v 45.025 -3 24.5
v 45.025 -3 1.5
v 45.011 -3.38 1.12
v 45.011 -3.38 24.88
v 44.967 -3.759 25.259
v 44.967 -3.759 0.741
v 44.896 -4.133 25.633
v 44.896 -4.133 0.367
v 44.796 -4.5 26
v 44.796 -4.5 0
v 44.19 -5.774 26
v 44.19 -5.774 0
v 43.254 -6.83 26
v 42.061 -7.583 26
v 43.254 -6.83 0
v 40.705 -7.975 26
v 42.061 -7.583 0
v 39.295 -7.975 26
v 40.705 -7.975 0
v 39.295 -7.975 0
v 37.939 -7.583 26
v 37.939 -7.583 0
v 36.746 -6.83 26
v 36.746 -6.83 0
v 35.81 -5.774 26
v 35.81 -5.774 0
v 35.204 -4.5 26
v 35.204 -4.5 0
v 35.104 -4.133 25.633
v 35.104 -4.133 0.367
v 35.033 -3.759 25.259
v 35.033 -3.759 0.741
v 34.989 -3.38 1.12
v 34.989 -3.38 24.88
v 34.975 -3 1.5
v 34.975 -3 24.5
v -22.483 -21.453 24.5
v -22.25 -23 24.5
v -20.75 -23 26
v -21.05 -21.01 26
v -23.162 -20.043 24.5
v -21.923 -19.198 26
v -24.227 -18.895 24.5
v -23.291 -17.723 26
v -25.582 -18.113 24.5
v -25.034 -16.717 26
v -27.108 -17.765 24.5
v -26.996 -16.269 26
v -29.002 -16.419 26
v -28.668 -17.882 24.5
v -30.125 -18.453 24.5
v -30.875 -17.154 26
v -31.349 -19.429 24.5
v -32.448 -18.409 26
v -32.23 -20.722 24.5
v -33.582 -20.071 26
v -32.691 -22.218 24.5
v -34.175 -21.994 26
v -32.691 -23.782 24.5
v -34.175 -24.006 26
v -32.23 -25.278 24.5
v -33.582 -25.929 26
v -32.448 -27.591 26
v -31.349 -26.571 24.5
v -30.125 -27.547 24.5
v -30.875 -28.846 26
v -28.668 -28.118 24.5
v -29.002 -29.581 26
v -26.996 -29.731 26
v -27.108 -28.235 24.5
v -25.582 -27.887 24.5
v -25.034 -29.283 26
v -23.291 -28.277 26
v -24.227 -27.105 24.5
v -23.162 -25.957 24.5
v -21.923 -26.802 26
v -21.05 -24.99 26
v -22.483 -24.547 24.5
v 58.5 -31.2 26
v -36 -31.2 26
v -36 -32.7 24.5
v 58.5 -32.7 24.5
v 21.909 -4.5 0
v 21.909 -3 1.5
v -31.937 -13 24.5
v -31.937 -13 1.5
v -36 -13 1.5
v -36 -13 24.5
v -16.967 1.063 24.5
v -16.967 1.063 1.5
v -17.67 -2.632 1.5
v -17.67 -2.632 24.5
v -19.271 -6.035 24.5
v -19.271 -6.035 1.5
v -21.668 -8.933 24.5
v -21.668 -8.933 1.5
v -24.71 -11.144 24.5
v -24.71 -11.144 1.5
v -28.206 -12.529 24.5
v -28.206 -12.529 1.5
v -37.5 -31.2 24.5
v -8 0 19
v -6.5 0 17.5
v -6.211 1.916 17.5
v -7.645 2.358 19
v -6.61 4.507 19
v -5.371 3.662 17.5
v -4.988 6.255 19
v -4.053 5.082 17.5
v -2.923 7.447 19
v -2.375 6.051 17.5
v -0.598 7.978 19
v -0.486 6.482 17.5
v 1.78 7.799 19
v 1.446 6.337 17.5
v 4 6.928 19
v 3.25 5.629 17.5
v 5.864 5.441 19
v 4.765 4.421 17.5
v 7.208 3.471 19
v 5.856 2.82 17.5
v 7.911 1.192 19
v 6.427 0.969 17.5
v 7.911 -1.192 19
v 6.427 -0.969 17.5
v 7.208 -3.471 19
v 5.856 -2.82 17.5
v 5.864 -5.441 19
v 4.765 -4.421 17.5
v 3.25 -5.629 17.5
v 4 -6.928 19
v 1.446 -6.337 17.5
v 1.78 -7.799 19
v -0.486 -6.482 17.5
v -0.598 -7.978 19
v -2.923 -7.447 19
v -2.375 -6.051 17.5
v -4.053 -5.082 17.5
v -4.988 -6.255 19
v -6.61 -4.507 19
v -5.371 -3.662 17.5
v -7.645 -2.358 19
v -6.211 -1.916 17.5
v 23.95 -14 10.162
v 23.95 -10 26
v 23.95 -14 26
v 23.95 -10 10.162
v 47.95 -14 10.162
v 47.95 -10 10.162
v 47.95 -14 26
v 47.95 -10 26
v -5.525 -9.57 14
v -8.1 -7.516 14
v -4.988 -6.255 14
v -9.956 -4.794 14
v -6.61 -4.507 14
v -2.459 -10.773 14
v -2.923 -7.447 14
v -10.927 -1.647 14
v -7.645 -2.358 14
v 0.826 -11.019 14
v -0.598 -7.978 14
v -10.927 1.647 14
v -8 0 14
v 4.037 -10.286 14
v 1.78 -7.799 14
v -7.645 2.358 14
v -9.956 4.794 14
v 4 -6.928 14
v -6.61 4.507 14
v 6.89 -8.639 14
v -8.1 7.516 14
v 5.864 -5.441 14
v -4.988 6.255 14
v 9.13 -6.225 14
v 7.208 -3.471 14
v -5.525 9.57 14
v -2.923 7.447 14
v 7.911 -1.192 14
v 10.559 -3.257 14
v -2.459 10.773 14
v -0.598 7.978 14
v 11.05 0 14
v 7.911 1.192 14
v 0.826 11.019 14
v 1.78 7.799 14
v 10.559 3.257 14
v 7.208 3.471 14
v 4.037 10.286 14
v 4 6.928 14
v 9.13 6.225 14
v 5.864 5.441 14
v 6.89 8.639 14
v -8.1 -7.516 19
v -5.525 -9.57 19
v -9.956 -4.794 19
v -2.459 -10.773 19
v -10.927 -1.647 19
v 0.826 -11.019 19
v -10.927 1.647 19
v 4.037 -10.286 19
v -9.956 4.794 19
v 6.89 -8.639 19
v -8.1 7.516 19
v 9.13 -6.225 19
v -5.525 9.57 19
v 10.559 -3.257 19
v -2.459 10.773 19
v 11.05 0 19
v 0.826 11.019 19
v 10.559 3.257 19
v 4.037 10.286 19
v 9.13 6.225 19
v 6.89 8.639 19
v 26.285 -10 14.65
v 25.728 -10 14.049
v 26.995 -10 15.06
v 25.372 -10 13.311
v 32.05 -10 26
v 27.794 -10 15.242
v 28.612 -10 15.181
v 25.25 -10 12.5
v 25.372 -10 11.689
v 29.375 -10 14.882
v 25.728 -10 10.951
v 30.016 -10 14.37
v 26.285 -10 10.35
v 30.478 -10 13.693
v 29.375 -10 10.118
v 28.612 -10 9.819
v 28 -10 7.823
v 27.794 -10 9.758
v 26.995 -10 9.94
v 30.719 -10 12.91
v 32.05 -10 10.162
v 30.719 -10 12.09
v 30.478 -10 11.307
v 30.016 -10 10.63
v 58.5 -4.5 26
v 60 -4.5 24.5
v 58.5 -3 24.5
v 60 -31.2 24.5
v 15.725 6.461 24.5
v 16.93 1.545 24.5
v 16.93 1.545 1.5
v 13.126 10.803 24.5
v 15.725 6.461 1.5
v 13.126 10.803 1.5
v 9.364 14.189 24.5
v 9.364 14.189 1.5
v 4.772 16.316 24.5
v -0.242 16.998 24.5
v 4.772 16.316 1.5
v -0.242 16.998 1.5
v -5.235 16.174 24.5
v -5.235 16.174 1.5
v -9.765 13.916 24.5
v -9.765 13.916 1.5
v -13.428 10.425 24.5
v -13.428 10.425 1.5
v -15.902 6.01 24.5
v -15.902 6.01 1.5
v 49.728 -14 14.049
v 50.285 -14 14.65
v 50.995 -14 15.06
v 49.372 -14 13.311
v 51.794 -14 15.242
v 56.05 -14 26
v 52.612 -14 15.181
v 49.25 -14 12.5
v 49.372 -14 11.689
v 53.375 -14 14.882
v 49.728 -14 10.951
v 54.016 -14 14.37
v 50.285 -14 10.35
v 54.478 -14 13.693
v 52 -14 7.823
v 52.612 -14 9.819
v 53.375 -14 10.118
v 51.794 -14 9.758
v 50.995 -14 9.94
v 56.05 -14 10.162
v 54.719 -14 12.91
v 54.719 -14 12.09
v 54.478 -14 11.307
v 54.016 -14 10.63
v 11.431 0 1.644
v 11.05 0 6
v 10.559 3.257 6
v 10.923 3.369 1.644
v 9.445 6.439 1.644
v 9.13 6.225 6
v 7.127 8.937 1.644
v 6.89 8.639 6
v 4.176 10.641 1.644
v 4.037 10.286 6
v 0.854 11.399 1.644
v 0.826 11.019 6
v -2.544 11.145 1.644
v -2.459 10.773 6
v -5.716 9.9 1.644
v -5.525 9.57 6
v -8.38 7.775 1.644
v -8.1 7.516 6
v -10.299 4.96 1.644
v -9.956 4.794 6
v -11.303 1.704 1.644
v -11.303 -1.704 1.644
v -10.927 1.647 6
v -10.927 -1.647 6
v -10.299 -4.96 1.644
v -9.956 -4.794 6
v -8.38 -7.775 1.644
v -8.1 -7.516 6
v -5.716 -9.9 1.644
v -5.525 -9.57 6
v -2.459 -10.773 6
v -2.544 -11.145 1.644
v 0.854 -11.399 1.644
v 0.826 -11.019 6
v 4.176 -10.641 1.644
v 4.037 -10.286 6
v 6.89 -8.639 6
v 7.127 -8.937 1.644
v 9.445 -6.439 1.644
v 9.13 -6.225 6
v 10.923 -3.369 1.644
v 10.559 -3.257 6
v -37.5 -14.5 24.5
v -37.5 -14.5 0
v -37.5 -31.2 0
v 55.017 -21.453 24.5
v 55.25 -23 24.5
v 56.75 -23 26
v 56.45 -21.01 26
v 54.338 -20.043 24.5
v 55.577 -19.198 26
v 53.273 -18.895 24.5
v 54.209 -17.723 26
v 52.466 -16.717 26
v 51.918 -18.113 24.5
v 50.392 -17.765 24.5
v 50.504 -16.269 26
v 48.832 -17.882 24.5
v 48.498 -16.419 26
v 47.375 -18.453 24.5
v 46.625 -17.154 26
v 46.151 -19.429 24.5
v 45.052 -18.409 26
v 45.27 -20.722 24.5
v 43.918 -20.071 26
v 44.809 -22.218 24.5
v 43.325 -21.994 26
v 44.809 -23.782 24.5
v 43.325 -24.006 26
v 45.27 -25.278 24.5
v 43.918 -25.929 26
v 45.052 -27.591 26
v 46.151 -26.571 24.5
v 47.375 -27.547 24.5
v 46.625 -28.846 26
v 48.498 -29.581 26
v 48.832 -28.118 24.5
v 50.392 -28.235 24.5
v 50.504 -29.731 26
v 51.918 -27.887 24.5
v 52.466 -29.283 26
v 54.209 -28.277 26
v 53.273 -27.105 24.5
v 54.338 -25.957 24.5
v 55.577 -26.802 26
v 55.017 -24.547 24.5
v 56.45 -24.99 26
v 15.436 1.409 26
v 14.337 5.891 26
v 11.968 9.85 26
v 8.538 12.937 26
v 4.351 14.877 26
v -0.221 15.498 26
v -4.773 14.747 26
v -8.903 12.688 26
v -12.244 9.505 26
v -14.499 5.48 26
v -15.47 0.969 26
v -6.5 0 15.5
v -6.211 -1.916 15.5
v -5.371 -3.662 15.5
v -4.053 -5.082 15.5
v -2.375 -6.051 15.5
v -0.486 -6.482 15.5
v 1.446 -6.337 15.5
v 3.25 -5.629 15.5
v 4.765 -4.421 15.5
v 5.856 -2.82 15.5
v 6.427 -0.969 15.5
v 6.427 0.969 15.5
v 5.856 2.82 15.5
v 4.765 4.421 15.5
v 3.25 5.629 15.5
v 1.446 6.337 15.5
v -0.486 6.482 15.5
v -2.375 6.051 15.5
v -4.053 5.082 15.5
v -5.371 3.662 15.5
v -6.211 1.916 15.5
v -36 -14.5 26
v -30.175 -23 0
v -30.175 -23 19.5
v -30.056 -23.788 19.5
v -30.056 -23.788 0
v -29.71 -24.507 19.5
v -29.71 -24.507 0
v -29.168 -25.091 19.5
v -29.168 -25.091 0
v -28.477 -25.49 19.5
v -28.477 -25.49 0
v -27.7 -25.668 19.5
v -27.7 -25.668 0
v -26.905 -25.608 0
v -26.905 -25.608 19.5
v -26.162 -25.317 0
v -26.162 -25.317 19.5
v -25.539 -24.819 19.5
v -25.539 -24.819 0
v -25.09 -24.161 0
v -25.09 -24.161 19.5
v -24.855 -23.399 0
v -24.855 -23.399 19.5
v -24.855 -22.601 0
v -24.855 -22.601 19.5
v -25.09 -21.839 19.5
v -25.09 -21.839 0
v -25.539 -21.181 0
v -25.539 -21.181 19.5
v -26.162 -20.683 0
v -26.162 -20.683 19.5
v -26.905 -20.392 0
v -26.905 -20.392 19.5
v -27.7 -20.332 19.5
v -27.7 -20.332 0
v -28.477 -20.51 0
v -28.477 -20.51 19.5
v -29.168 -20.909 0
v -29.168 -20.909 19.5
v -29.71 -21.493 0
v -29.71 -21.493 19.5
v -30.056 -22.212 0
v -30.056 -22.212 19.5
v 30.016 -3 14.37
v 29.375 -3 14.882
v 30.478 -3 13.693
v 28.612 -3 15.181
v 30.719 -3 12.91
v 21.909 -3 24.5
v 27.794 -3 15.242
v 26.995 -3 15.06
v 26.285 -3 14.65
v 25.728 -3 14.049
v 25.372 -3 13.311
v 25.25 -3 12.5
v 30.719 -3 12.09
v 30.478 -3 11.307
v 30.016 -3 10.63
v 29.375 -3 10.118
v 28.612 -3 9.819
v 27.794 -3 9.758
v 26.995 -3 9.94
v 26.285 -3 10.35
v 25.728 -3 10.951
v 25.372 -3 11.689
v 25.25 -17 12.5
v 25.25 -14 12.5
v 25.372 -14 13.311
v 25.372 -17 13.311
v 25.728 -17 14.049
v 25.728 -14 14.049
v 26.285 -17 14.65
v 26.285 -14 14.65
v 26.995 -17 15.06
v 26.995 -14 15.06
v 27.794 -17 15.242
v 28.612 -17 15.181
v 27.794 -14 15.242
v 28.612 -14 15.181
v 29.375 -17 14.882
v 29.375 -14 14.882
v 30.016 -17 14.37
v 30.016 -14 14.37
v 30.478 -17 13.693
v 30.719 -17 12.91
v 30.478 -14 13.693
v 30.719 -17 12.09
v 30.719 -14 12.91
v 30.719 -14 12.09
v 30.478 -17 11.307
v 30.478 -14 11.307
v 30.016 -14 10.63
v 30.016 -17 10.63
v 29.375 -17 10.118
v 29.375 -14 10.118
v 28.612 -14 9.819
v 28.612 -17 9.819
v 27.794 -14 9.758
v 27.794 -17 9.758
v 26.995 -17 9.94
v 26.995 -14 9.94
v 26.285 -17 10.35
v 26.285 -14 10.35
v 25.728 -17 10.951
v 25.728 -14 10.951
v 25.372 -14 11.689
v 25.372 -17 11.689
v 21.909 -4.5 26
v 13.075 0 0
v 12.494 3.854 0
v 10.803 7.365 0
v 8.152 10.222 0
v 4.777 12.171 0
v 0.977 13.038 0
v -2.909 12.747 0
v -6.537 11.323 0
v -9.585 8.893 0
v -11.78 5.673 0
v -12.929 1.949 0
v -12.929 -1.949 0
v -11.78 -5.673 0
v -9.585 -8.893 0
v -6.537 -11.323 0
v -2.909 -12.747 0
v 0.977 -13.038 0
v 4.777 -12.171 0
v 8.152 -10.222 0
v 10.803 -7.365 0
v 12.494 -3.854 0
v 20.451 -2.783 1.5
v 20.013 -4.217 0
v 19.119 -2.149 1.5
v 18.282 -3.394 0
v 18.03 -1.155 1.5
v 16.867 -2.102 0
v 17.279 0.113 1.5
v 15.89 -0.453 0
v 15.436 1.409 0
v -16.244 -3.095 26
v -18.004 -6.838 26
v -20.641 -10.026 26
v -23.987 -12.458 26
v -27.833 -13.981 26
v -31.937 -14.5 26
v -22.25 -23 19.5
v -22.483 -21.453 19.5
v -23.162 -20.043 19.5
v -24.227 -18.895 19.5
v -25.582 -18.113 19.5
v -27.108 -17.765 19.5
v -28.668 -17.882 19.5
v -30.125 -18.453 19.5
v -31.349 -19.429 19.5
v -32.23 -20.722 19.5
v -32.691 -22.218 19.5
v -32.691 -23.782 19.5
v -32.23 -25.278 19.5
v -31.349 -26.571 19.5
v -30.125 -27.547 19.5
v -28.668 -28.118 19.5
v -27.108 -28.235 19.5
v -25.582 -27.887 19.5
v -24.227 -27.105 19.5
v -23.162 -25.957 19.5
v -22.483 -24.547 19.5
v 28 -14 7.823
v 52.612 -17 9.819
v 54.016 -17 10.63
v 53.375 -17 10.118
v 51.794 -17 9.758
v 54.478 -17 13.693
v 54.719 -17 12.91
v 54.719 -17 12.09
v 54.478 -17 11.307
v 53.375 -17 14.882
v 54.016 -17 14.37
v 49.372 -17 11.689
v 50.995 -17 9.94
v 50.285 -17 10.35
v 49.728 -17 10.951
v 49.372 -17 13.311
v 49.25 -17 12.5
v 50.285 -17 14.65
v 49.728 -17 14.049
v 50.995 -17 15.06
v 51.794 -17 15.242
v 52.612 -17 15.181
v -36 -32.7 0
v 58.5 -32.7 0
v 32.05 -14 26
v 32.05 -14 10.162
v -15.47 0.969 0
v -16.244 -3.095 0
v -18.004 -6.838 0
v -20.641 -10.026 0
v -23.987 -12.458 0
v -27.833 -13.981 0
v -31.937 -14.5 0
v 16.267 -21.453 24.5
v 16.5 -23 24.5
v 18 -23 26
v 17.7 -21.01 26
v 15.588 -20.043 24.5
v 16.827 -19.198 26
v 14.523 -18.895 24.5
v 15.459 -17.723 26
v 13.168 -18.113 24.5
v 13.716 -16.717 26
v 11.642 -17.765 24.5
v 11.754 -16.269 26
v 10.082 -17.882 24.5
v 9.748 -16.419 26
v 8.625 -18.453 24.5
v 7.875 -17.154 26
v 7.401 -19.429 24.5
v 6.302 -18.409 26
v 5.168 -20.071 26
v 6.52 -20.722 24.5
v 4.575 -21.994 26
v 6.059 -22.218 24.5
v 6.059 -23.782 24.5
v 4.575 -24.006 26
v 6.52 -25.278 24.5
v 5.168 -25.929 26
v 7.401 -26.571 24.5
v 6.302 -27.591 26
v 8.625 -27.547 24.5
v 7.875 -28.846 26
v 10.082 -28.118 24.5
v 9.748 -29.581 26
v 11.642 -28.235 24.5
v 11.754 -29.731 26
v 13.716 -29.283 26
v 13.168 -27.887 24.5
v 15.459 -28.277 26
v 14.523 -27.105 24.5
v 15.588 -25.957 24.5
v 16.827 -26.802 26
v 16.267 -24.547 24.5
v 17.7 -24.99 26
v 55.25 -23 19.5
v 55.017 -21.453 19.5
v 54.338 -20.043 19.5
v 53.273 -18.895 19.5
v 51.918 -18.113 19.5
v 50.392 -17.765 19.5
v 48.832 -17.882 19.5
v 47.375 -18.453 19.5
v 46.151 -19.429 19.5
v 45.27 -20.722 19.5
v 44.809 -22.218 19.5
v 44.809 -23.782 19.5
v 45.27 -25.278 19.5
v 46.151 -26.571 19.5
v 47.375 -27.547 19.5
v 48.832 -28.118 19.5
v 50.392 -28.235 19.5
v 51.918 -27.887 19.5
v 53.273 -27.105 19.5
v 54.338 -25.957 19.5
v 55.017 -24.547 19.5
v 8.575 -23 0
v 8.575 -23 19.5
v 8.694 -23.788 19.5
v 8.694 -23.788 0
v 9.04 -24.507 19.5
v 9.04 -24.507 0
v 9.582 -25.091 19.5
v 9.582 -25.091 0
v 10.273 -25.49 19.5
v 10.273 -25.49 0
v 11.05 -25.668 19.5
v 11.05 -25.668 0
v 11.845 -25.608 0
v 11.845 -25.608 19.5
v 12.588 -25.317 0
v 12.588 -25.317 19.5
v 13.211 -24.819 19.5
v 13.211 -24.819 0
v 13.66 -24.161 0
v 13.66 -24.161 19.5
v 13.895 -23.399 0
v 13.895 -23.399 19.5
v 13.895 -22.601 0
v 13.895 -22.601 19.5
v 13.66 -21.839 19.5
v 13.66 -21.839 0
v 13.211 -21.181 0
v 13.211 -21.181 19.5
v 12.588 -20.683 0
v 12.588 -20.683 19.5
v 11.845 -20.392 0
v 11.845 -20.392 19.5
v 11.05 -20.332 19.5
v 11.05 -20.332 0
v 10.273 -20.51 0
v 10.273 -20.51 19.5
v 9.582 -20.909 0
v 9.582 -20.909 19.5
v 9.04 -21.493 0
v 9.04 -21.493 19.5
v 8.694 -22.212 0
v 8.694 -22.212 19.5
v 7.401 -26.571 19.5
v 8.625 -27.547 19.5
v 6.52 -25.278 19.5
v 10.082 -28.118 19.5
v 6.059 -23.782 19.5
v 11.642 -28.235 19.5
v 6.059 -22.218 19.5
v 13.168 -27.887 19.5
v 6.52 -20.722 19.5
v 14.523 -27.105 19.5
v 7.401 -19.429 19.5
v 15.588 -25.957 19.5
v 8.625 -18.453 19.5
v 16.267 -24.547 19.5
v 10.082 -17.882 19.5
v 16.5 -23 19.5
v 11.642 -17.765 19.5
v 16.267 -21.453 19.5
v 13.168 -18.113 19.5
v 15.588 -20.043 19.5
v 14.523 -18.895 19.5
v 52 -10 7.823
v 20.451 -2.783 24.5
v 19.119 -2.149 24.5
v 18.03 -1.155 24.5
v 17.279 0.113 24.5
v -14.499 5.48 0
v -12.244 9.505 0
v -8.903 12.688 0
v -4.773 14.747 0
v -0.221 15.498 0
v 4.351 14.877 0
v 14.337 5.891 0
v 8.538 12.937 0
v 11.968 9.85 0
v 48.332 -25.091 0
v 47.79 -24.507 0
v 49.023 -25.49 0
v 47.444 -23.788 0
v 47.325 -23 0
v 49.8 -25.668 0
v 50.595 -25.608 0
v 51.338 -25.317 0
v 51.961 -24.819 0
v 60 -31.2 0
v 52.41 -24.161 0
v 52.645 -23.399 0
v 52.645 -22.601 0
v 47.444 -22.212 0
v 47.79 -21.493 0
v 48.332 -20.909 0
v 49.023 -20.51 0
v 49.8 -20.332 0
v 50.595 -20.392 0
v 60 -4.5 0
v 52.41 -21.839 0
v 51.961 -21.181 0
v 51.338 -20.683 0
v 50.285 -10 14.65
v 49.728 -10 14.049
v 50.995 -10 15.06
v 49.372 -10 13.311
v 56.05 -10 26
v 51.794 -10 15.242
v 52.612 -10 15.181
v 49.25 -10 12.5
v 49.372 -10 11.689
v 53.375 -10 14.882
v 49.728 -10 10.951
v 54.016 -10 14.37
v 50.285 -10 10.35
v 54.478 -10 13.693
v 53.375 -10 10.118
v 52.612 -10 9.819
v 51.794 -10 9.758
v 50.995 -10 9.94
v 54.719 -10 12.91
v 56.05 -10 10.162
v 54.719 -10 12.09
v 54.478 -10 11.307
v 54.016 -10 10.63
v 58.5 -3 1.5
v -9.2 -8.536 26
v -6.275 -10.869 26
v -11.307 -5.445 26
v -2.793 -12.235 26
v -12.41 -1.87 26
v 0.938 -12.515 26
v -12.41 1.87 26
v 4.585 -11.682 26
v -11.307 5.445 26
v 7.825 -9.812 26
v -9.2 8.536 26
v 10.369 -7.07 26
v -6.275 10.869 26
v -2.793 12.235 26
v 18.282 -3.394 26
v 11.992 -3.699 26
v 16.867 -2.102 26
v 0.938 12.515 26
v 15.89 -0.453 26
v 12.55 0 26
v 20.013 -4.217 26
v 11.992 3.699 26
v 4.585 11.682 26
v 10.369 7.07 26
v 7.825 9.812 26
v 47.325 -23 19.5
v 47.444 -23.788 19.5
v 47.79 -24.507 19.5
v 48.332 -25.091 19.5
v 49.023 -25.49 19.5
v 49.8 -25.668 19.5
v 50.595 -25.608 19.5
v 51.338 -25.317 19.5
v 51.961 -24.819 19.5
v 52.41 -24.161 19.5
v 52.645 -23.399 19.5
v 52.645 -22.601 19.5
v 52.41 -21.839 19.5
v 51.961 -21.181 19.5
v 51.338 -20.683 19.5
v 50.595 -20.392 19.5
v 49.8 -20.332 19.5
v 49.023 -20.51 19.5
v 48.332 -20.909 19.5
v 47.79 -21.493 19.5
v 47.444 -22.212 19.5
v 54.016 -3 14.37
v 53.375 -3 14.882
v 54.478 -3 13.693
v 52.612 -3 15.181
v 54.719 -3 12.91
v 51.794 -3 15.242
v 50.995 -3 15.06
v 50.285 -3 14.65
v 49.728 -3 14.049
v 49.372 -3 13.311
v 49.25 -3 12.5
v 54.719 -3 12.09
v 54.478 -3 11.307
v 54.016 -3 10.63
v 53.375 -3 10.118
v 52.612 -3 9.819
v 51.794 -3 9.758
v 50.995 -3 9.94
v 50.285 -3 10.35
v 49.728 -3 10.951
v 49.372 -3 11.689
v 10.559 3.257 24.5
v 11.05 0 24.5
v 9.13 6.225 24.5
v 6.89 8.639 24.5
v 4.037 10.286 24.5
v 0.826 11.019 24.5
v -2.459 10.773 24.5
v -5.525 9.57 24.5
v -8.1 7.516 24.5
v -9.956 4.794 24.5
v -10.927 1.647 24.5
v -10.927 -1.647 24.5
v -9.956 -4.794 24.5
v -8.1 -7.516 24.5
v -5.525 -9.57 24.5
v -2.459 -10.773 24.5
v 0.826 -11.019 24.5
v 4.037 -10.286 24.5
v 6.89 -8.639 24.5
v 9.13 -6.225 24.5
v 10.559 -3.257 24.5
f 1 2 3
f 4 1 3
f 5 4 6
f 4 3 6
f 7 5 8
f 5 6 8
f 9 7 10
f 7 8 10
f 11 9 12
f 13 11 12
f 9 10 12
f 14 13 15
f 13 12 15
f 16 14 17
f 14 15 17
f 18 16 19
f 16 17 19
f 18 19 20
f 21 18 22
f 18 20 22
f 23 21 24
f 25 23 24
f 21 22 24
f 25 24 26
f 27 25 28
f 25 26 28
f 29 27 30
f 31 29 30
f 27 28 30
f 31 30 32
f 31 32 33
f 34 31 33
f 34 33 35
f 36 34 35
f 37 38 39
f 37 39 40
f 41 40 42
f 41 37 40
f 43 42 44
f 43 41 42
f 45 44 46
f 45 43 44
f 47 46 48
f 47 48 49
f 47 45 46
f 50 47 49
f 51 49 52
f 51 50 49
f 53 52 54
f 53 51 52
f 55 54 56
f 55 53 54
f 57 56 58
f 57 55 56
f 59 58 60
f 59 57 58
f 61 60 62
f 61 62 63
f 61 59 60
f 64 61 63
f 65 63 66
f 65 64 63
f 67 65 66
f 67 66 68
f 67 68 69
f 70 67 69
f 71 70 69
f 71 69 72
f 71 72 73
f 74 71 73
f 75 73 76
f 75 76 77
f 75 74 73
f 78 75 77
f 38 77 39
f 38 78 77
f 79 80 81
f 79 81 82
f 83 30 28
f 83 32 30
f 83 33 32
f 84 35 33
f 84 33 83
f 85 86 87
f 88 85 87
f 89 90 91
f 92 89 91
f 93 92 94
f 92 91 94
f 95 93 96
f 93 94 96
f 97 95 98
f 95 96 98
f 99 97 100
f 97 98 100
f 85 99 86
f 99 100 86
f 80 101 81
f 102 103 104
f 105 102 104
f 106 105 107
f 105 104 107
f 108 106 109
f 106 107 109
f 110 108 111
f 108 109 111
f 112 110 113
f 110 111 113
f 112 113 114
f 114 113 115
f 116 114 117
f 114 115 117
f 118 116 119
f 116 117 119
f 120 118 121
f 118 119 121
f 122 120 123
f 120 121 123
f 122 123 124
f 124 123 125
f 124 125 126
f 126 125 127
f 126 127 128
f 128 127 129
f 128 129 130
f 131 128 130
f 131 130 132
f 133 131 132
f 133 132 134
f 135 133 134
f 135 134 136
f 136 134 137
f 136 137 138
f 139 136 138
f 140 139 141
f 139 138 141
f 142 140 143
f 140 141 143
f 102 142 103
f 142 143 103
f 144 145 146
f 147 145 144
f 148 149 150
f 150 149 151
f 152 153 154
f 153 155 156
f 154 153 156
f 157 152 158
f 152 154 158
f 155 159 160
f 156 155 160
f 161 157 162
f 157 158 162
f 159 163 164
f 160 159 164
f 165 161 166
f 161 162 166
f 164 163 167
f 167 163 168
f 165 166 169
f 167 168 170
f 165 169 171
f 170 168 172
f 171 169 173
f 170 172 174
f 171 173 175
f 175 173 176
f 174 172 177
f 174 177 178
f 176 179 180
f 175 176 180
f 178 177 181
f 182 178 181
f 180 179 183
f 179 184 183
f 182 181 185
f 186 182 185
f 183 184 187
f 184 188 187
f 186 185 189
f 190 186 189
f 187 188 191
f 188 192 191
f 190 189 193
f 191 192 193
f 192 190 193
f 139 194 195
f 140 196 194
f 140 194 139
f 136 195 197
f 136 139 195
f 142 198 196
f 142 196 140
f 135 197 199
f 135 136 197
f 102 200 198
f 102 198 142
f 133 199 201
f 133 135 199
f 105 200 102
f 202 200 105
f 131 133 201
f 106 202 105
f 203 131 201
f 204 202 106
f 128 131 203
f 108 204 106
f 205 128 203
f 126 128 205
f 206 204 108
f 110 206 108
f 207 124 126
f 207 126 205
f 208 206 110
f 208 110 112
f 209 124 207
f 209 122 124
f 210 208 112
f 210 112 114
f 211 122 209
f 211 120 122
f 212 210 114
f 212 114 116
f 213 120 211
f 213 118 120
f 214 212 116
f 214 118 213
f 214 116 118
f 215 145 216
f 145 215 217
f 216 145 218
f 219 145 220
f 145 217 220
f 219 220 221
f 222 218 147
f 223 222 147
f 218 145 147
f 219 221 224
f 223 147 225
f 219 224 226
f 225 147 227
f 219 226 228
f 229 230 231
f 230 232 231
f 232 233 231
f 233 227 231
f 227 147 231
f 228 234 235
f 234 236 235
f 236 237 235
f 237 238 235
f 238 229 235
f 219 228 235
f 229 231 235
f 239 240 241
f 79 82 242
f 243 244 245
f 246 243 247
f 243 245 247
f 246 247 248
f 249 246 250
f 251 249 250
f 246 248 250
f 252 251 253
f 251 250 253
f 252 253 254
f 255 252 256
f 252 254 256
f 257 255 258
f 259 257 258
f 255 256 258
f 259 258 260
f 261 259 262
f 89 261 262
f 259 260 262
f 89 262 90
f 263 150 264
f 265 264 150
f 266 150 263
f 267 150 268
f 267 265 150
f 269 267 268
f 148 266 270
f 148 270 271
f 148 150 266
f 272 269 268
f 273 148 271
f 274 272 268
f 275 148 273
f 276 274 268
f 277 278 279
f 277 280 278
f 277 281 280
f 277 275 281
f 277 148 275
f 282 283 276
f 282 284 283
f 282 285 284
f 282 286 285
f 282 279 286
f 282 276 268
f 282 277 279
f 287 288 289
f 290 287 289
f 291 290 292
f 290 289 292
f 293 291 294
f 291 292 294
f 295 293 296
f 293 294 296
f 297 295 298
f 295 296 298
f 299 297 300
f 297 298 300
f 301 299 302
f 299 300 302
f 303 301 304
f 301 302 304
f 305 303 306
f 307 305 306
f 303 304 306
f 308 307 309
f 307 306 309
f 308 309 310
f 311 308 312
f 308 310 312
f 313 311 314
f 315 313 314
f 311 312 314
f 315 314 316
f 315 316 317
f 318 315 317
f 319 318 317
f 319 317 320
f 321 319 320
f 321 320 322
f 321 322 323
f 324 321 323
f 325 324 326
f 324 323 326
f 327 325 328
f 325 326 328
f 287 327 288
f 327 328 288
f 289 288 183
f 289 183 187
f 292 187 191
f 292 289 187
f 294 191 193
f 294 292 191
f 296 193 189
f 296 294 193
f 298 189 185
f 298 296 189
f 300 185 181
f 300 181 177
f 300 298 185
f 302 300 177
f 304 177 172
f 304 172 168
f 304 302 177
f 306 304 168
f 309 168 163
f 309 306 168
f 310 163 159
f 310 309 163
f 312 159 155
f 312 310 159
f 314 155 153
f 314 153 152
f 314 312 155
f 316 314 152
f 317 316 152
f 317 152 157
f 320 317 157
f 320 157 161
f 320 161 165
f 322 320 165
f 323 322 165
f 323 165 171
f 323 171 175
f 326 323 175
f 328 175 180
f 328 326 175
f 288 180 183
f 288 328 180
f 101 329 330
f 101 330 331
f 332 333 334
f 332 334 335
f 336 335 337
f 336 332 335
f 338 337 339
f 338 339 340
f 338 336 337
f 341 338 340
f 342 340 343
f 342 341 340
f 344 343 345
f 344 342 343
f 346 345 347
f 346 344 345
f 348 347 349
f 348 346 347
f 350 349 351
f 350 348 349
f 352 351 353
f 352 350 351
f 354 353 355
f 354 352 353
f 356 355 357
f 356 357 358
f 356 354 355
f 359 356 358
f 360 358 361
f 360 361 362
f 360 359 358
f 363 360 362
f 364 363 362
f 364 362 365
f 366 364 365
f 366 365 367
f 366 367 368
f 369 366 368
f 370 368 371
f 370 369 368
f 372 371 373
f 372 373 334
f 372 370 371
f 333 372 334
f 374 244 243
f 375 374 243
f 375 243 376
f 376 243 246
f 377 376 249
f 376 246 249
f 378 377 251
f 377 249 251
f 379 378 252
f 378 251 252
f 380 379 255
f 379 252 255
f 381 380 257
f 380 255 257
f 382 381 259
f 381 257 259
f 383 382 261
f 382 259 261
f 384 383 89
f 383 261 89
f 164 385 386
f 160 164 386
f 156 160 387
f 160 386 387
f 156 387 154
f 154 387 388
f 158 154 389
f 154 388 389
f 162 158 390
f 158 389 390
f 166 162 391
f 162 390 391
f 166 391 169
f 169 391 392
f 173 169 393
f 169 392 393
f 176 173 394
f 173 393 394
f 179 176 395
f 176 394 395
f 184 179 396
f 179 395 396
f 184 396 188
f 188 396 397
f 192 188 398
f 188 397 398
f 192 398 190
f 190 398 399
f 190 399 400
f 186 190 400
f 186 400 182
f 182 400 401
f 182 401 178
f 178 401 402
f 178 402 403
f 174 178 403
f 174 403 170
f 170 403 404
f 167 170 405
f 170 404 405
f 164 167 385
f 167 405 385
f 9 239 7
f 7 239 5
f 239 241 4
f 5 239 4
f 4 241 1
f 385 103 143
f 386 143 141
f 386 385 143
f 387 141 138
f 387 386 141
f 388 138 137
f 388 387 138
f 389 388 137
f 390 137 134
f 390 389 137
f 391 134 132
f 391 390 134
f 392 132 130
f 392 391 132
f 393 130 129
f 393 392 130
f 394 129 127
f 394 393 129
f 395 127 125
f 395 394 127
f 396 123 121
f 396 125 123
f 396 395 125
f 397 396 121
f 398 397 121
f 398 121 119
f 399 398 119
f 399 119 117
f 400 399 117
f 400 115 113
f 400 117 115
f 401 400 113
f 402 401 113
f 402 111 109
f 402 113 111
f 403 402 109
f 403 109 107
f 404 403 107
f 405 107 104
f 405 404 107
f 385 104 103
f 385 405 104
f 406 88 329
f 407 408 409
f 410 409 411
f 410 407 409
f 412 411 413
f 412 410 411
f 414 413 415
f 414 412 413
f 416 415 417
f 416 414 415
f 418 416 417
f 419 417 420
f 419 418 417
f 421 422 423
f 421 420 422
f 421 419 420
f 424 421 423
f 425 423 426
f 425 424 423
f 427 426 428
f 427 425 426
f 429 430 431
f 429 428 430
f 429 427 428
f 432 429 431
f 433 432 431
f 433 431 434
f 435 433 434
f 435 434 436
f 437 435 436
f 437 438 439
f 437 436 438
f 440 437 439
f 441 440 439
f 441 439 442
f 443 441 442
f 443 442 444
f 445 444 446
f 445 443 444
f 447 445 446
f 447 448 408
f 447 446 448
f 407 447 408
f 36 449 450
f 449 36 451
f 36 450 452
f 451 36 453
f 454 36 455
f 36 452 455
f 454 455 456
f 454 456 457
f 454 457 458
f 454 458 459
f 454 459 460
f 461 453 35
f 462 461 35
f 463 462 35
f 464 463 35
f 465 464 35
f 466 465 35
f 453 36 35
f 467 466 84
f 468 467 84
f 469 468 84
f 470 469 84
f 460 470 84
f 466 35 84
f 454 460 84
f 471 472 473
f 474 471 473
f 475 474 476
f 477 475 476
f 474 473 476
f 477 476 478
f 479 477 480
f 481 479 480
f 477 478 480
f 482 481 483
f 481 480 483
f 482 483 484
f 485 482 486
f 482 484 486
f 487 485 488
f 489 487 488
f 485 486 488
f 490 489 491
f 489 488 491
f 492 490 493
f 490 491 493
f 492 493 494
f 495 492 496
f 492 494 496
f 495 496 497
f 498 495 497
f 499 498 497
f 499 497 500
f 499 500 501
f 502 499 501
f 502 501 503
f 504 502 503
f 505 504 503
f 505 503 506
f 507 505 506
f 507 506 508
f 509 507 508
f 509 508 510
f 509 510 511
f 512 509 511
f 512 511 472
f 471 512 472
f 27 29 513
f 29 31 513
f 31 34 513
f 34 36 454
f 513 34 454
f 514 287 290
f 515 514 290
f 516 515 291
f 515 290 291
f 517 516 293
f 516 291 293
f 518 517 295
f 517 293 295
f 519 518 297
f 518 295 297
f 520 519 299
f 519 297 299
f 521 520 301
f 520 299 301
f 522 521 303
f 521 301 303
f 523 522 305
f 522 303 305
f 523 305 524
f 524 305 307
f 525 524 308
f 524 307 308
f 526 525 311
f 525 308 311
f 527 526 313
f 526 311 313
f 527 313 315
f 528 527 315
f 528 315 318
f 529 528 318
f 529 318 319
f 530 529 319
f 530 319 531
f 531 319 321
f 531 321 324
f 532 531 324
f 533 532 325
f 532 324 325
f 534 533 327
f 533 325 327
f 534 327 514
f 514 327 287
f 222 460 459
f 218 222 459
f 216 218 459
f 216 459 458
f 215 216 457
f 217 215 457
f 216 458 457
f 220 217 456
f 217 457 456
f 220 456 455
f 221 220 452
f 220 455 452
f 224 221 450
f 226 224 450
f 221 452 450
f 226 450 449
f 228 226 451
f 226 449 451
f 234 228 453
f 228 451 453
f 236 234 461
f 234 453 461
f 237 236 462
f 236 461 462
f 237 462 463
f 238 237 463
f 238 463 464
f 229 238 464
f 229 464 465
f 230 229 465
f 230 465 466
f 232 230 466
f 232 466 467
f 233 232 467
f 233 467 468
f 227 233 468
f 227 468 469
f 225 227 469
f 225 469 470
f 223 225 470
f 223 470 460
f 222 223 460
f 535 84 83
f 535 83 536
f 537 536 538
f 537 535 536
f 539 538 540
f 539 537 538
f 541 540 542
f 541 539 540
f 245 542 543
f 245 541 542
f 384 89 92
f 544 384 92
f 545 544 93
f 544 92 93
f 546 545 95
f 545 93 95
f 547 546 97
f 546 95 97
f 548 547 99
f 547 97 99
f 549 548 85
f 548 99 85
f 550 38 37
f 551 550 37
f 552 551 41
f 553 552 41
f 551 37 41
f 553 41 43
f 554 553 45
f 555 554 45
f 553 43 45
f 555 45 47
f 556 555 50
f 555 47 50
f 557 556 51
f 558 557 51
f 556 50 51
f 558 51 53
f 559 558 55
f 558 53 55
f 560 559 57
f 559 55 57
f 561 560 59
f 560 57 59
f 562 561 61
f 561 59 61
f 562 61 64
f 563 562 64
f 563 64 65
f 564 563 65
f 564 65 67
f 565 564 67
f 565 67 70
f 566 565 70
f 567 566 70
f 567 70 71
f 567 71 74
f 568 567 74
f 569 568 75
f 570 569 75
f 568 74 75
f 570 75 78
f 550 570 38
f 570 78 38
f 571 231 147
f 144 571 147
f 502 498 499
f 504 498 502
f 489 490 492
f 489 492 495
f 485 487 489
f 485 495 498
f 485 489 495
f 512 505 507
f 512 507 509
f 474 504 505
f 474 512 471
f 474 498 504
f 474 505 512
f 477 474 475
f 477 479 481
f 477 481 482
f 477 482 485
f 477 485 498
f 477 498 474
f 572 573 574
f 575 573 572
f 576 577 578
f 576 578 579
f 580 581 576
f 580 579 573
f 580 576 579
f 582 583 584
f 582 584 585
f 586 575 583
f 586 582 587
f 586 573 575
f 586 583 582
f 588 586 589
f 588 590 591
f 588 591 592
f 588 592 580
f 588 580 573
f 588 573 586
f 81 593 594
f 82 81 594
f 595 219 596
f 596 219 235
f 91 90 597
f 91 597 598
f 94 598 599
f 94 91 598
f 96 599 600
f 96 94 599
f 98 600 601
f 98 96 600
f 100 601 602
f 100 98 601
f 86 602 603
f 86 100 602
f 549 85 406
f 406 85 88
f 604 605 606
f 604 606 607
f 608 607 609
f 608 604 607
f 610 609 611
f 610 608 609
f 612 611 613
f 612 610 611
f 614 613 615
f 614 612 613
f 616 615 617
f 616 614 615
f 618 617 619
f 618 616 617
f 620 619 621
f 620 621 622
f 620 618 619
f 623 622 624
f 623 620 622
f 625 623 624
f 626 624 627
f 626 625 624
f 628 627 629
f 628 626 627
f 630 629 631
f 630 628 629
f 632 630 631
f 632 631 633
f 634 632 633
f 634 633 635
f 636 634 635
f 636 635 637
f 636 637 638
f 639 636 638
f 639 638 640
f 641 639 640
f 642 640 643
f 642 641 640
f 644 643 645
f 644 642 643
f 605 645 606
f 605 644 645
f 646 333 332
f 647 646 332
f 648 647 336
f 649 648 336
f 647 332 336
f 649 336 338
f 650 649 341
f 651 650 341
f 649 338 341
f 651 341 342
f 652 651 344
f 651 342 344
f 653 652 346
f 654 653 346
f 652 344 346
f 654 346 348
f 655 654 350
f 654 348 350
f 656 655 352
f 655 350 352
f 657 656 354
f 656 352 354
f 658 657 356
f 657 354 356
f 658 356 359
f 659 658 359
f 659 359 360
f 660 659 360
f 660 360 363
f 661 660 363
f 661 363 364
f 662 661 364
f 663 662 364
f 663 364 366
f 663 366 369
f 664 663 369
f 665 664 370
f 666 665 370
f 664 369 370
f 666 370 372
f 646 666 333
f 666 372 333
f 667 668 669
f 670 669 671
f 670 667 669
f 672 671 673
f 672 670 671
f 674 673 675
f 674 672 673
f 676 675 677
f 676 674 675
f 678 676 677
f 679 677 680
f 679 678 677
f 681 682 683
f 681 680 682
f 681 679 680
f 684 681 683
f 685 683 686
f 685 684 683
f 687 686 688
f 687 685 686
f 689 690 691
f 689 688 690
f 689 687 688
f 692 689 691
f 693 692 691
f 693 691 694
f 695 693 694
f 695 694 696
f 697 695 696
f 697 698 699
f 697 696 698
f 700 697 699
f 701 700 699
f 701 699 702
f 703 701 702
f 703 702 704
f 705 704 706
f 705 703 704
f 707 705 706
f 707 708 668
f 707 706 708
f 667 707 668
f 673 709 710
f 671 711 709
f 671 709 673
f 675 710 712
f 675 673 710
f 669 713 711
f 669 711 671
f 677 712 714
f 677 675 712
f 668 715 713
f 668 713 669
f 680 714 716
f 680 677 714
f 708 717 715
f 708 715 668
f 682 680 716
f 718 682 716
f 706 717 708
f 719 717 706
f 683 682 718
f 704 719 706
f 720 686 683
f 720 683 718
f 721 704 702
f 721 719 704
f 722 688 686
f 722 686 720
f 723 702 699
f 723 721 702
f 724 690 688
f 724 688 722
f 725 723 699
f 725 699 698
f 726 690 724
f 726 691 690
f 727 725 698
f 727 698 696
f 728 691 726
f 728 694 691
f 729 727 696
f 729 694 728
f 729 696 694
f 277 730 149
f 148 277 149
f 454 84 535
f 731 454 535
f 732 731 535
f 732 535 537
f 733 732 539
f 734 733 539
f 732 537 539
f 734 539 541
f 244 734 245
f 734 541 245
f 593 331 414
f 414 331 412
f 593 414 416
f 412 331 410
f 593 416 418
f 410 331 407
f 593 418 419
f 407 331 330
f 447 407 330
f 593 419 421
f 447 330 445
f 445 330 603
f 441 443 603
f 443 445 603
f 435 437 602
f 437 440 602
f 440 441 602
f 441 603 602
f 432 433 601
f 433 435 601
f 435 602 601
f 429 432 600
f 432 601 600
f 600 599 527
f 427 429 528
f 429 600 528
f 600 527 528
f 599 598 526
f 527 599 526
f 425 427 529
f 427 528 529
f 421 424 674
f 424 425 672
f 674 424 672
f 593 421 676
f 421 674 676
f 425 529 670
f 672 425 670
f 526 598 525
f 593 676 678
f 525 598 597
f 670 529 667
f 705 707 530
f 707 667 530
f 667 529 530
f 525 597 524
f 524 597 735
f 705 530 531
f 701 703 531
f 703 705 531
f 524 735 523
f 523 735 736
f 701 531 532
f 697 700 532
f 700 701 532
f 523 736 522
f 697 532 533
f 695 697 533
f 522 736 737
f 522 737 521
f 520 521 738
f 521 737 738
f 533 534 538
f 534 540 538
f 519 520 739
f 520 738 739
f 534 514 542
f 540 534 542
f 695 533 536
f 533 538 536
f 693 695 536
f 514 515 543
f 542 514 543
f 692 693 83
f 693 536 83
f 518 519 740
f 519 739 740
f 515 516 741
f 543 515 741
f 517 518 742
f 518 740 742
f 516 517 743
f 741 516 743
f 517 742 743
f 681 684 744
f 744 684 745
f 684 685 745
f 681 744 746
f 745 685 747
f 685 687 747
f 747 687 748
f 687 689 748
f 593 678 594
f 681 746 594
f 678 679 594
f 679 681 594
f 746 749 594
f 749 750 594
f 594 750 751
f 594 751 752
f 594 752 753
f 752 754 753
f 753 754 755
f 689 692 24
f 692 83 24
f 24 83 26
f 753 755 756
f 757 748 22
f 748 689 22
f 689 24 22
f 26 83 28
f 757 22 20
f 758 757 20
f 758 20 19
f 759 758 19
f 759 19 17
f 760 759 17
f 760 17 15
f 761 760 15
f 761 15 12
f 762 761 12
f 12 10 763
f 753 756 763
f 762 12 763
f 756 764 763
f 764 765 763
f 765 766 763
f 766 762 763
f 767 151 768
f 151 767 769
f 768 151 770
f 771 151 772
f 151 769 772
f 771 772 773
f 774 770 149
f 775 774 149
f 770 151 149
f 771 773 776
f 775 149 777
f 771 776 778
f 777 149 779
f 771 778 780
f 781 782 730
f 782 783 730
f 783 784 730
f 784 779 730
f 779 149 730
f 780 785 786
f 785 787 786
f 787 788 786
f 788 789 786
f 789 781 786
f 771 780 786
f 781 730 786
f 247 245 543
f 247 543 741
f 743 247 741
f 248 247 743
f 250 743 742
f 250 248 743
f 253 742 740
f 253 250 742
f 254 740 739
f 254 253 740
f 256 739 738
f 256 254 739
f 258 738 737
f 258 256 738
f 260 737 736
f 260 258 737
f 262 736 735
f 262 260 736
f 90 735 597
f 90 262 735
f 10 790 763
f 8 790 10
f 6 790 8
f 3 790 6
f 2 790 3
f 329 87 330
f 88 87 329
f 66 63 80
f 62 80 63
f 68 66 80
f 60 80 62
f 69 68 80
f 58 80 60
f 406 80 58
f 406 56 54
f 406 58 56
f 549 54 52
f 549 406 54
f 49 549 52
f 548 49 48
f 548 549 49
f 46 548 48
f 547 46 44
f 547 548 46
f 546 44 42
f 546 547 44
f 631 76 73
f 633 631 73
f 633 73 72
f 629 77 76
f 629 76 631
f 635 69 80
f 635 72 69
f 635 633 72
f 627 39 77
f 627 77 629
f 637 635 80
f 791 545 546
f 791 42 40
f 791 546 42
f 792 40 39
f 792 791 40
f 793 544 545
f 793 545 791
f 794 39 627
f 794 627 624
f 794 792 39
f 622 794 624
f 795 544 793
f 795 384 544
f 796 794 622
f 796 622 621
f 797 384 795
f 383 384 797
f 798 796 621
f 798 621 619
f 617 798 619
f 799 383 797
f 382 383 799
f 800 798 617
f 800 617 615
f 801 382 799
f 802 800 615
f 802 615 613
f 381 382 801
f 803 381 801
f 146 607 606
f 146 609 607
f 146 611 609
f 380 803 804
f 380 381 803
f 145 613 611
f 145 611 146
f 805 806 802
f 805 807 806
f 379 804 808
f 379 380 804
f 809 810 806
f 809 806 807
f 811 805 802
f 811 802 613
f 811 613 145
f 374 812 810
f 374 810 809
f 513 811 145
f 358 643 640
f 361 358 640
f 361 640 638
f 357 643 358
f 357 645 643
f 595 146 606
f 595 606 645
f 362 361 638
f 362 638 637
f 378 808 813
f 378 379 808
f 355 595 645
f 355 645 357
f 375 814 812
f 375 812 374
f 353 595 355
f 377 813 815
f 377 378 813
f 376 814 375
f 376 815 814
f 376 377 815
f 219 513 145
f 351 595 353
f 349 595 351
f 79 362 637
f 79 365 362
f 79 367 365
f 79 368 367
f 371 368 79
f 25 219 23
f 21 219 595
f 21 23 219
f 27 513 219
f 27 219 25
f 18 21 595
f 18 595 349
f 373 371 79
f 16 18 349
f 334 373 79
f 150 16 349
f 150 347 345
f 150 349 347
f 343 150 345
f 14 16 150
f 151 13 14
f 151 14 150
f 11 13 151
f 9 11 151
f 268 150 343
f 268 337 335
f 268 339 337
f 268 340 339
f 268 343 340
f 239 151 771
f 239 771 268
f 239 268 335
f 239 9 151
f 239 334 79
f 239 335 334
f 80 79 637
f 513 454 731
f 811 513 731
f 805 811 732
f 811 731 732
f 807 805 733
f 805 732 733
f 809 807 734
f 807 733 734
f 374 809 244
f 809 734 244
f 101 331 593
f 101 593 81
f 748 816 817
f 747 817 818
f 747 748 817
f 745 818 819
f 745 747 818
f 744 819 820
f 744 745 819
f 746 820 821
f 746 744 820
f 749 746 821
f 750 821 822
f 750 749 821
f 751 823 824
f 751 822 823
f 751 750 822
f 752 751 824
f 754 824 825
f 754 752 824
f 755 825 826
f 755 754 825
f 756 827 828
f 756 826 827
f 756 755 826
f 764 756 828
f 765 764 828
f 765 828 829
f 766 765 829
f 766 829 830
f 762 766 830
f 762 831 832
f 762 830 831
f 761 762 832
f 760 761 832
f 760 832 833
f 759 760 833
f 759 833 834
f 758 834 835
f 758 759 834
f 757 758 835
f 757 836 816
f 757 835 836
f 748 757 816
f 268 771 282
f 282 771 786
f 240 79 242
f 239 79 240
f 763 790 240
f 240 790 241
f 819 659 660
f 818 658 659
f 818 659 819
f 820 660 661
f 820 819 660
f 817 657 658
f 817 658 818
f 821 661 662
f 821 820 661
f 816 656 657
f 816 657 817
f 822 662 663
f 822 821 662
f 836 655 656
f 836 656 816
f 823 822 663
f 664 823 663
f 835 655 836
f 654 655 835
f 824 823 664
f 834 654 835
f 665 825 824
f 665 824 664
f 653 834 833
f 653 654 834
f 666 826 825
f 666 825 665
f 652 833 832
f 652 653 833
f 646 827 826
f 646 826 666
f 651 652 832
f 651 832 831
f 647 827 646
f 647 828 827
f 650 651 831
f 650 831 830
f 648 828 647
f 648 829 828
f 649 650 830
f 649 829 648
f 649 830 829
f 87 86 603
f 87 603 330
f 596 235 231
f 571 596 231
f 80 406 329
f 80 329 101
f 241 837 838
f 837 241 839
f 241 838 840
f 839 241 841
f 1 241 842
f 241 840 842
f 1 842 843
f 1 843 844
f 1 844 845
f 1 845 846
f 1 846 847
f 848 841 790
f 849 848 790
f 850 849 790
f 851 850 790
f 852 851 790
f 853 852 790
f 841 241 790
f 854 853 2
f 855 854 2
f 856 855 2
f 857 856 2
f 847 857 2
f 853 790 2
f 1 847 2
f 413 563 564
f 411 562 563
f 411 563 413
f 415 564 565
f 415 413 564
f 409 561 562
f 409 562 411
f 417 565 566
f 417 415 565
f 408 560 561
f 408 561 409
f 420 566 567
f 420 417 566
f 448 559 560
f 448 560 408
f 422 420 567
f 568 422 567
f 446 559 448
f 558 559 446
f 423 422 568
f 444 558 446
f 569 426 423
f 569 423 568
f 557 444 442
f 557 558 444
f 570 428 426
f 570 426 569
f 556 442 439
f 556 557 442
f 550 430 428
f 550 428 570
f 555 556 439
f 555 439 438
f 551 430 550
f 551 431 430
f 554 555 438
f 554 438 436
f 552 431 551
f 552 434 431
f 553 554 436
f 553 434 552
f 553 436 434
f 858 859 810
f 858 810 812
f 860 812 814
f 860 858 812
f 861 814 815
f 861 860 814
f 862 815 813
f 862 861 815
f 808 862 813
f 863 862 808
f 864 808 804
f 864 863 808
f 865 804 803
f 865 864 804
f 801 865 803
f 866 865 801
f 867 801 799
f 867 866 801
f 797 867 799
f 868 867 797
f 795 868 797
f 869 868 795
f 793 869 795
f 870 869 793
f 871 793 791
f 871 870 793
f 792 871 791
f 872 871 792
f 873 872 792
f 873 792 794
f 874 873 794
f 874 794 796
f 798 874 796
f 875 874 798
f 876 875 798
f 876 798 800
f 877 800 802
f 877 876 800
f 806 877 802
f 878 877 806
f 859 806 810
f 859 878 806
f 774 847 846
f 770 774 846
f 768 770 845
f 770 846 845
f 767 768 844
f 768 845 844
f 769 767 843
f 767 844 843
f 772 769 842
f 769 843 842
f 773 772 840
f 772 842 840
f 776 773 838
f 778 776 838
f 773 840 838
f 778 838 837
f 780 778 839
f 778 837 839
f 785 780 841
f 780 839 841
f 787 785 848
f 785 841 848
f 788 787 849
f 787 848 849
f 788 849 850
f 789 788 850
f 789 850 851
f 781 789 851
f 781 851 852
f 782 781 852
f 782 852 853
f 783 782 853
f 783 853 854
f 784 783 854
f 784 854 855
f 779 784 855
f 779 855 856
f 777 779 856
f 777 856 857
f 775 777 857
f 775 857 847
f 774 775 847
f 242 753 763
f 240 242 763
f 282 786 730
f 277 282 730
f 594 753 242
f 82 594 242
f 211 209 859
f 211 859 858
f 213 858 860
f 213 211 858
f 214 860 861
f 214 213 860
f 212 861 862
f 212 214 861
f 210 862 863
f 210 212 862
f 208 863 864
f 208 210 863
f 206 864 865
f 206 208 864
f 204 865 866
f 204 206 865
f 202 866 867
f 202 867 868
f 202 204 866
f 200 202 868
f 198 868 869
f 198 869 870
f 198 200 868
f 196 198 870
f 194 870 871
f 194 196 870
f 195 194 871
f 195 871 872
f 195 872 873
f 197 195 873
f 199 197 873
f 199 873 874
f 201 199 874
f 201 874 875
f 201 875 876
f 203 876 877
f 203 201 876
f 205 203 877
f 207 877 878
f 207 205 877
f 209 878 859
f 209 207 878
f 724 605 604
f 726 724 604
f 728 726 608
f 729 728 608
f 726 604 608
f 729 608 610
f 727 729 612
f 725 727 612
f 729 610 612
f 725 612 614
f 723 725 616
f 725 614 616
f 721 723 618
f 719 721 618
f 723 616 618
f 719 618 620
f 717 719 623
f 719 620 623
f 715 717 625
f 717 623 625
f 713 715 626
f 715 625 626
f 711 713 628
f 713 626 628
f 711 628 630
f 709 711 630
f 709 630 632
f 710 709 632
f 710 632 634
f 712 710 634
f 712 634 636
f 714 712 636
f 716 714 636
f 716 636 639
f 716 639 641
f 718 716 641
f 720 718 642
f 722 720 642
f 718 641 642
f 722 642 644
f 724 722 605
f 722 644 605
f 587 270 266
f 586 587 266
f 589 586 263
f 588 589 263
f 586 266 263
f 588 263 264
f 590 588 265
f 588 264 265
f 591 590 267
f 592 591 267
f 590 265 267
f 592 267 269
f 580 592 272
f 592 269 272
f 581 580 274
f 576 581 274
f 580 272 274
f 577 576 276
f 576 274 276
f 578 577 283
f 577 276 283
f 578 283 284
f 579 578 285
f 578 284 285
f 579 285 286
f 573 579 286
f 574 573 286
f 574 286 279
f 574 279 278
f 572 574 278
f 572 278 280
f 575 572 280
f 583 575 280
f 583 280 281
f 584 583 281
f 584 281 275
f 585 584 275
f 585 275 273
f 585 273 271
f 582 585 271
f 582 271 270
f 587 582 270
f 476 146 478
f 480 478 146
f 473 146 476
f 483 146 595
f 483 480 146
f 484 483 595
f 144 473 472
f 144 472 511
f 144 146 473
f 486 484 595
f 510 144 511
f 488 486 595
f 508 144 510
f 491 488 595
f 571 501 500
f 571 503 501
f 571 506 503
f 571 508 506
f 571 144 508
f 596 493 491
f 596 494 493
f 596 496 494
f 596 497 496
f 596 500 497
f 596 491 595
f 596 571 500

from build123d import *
from OCP.BRepFilletAPI import BRepFilletAPI_MakeChamfer

# Parameters (mm, degrees)
SKETCH1_R           = 2.675
SKETCH1_R_2         = 6.5
BOSS_EXTRUDE1_DEPTH = 26
CUT_EXTRUDE2_START  = 6
SKETCH1_4_R         = 11.05
SKETCH1_4_R_2       = 6.5
CUT_EXTRUDE2_DEPTH  = 8
SKETCH5_R           = 11.05
CUT_EXTRUDE6_DEPTH  = 6
CUT_EXTRUDE6_DRAFT  = 5
SKETCH4_R           = 5.25
CUT_EXTRUDE5_DEPTH  = 6.5
CUT_EXTRUDE10_START = -7
SKETCH9_R           = 11.05
CUT_EXTRUDE10_DEPTH = 7
CHAMFER5_SIZE       = 1.5
CHAMFER5_SIZE2      = 1.650094301
SKETCH6_R           = 2.75
CUT_EXTRUDE7_DEPTH  = 14
CUT_EXTRUDE8_START  = -7
SKETCH7_R           = 2.75
SKETCH7_W           = 8.1
SKETCH7_H           = 1.5
CUT_EXTRUDE8_DEPTH  = 4


with BuildPart() as part:
    # Sketch1 → Boss-Extrude1 (new body)
    with BuildSketch(Plane.XY):
        with BuildLine():
            Line((-37.5, -32.7), (60, -32.7))
            Line((60, -32.7), (60, -3))
            Line((60, -3), (45.025, -3))
            ThreePointArc((45.025, -3), (40, -8.025), (34.975, -3))
            Line((34.975, -3), (21.9089023, -3))
            ThreePointArc((21.9089023, -3), (18.537902988, -1.692744729), (16.929606323, 1.545454545))
            ThreePointArc((16.929606323, 1.545454545), (-0.242190945, 16.998274723), (-16.966764387, 1.0625))
            ThreePointArc((-16.966764387, 1.0625), (-21.667640892, -8.933034803), (-31.937438845, -13))
            Line((-31.937438845, -13), (-37.5, -13))
            Line((-37.5, -13), (-37.5, -32.7))
        make_face()
        with Locations(Location((-27.5, -23, 0), (0, 0, 180))):
            Circle(SKETCH1_R, mode=Mode.SUBTRACT)
        with Locations(Location((50, -23, 0), (0, 0, 180))):
            Circle(SKETCH1_R, mode=Mode.SUBTRACT)
        with Locations(Location((0, 0, 0), (0, 0, 180))):
            Circle(SKETCH1_R_2, mode=Mode.SUBTRACT)
        with Locations(Location((11.25, -23, 0), (0, 0, 180))):
            Circle(SKETCH1_R, mode=Mode.SUBTRACT)
    extrude(amount=BOSS_EXTRUDE1_DEPTH)

    # Sketch1<4> → Cut-Extrude2 (cut)
    with BuildSketch(Plane.XY.offset(CUT_EXTRUDE2_START)):
        Circle(SKETCH1_4_R)
        with Locations(Location((0, 0, 0), (0, 0, 180))):
            Circle(SKETCH1_4_R_2, mode=Mode.SUBTRACT)
    extrude(amount=CUT_EXTRUDE2_DEPTH, mode=Mode.SUBTRACT)


with BuildPart() as cut_extrude6_tool:
    # Sketch5 → Cut-Extrude6 (with draft: the straight prism first)
    with BuildSketch(Plane.XY.offset(6)):
        Circle(SKETCH5_R)
    extrude(amount=-CUT_EXTRUDE6_DEPTH)
    # Cut-Extrude6: the draft: its side faces are tilted about the plane it starts from
    cut_extrude6_sides = [cut_extrude6_tool.faces().sort_by_distance(p)[0] for p in [
        (-11.05, 0, 3),
    ]]
    draft(cut_extrude6_sides, Plane.XY.offset(6), CUT_EXTRUDE6_DRAFT)


with BuildPart() as part_1:
    add(part.part)

    # Cut-Extrude6: cut by cut_extrude6_tool
    add(cut_extrude6_tool.part, mode=Mode.SUBTRACT)

    # Sketch4 → Cut-Extrude5 (cut)
    with BuildSketch(Plane.XY.offset(26)):
        with Locations((-27.5, -23)):
            Circle(SKETCH4_R)
        with Locations((50, -23)):
            Circle(SKETCH4_R)
        with Locations((11.25, -23)):
            Circle(SKETCH4_R)
    extrude(amount=-CUT_EXTRUDE5_DEPTH, mode=Mode.SUBTRACT)

    # Sketch9 → Cut-Extrude10 (cut)
    with BuildSketch(Plane.XY.offset(26).offset(CUT_EXTRUDE10_START)):
        Circle(SKETCH9_R)
    extrude(amount=CUT_EXTRUDE10_DEPTH, mode=Mode.SUBTRACT)

    # Chamfer5: one chamfer whose edges measure the first distance from different faces: ONE call of the kernel's chamfer builder (chamfer() names one face for all edges)
    chamfer5_edges_1 = [part_1.edges().sort_by_distance(p)[0] for p in [
        (28.44195115, -3, 26),
        (18.537902988, -1.692744729, 26),
        (52.5125, -3, 0),
        (-34.718719423, -13, 0),
        (-21.667640892, -8.933034803, 0),
        (-0.242190945, 16.998274723, 0),
        (-0.242190945, 16.998274723, 26),
        (18.537902988, -1.692744729, 0),
        (28.44195115, -3, 0),
        (-21.667640892, -8.933034803, 26),
        (60, -3, 13),
        (60, -32.7, 13),
        (-37.5, -32.7, 13),
        (-37.5, -13, 13),
        (-34.718719423, -13, 26),
        (-37.5, -22.85, 26),
        (11.25, -32.7, 26),
        (60, -17.85, 26),
        (6.5, 0, 14),
        (52.5125, -3, 26),
        (-32.75, -23, 26),
        (44.75, -23, 26),
        (6, -23, 26),
        (6.5, 0, 19),
        (-11.05, 0, 26),
    ]]
    chamfer5_edges_2 = [part_1.edges().sort_by_distance(p)[0] for p in [
        (-11.574931981, 0, 0),
    ]]
    chamfer5_side_2 = [part_1.faces().sort_by_distance(p)[0] for p in [
        (12.610092139, -16.470965453, 0),
    ]]
    chamfer5 = BRepFilletAPI_MakeChamfer(part_1.part.solid().wrapped)
    for e in chamfer5_edges_1:
        chamfer5.Add(CHAMFER5_SIZE, e.wrapped)
    for e in chamfer5_edges_2:
        chamfer5.Add(CHAMFER5_SIZE, CHAMFER5_SIZE2, e.wrapped, chamfer5_side_2[0].wrapped)  # the first distance lies on this face
    add(Compound.cast(chamfer5.Shape()), mode=Mode.REPLACE)

    # Sketch6 → Cut-Extrude7 (cut)
    with BuildSketch(Plane(origin=(0, -3, 0), x_dir=(1, 0, 0), z_dir=(0, 1, 0))):
        with Locations(Location((52, -12.5, 0), (0, 0, 180))):
            Circle(SKETCH6_R)
        with Locations(Location((28, -12.5, 0), (0, 0, 180))):
            Circle(SKETCH6_R)
    extrude(amount=-CUT_EXTRUDE7_DEPTH, mode=Mode.SUBTRACT)

    # Sketch7 → Cut-Extrude8 (cut)
    # profile 1 of 5: a face of its own
    with BuildSketch(Plane(origin=(0, -3, 0), x_dir=(1, 0, 0), z_dir=(0, 1, 0)).offset(CUT_EXTRUDE8_START)):
        Polygon((23.95, -10.16173141), (23.95, -14.83826859), (28, -17.17653718), (32.05, -14.83826859), (32.05, -10.16173141), (28, -7.82346282), align=None)
        with Locations(Location((28, -12.5, 0), (0, 0, 180))):
            Circle(SKETCH7_R, mode=Mode.SUBTRACT)
    # profile 2 of 5: a face of its own
    with BuildSketch(Plane(origin=(0, -3, 0), x_dir=(1, 0, 0), z_dir=(0, 1, 0)).offset(CUT_EXTRUDE8_START)):
        Polygon((28, -17.17653718), (23.95, -14.83826859), (23.95, -24.5), (32.05, -24.5), (32.05, -14.83826859), align=None)
    # profile 3 of 5: a face of its own
    with BuildSketch(Plane(origin=(0, -3, 0), x_dir=(1, 0, 0), z_dir=(0, 1, 0)).offset(CUT_EXTRUDE8_START)):
        Polygon((47.95, -10.16173141), (47.95, -14.83826859), (52, -17.17653718), (56.05, -14.83826859), (56.05, -10.16173141), (52, -7.82346282), align=None)
    # profile 4 of 5: a face of its own
    with BuildSketch(Plane(origin=(0, -3, 0), x_dir=(1, 0, 0), z_dir=(0, 1, 0)).offset(CUT_EXTRUDE8_START)):
        Polygon((47.95, -26), (56.05, -26), (56.05, -14.83826859), (52, -17.17653718), (47.95, -14.83826859), align=None)
    # profile 5 of 5: a face of its own
    with BuildSketch(Plane(origin=(0, -3, 0), x_dir=(1, 0, 0), z_dir=(0, 1, 0)).offset(CUT_EXTRUDE8_START)):
        with Locations((28, -25.25)):
            Rectangle(SKETCH7_W, SKETCH7_H)
    extrude(amount=-CUT_EXTRUDE8_DEPTH, mode=Mode.SUBTRACT)


solid = part_1.part
